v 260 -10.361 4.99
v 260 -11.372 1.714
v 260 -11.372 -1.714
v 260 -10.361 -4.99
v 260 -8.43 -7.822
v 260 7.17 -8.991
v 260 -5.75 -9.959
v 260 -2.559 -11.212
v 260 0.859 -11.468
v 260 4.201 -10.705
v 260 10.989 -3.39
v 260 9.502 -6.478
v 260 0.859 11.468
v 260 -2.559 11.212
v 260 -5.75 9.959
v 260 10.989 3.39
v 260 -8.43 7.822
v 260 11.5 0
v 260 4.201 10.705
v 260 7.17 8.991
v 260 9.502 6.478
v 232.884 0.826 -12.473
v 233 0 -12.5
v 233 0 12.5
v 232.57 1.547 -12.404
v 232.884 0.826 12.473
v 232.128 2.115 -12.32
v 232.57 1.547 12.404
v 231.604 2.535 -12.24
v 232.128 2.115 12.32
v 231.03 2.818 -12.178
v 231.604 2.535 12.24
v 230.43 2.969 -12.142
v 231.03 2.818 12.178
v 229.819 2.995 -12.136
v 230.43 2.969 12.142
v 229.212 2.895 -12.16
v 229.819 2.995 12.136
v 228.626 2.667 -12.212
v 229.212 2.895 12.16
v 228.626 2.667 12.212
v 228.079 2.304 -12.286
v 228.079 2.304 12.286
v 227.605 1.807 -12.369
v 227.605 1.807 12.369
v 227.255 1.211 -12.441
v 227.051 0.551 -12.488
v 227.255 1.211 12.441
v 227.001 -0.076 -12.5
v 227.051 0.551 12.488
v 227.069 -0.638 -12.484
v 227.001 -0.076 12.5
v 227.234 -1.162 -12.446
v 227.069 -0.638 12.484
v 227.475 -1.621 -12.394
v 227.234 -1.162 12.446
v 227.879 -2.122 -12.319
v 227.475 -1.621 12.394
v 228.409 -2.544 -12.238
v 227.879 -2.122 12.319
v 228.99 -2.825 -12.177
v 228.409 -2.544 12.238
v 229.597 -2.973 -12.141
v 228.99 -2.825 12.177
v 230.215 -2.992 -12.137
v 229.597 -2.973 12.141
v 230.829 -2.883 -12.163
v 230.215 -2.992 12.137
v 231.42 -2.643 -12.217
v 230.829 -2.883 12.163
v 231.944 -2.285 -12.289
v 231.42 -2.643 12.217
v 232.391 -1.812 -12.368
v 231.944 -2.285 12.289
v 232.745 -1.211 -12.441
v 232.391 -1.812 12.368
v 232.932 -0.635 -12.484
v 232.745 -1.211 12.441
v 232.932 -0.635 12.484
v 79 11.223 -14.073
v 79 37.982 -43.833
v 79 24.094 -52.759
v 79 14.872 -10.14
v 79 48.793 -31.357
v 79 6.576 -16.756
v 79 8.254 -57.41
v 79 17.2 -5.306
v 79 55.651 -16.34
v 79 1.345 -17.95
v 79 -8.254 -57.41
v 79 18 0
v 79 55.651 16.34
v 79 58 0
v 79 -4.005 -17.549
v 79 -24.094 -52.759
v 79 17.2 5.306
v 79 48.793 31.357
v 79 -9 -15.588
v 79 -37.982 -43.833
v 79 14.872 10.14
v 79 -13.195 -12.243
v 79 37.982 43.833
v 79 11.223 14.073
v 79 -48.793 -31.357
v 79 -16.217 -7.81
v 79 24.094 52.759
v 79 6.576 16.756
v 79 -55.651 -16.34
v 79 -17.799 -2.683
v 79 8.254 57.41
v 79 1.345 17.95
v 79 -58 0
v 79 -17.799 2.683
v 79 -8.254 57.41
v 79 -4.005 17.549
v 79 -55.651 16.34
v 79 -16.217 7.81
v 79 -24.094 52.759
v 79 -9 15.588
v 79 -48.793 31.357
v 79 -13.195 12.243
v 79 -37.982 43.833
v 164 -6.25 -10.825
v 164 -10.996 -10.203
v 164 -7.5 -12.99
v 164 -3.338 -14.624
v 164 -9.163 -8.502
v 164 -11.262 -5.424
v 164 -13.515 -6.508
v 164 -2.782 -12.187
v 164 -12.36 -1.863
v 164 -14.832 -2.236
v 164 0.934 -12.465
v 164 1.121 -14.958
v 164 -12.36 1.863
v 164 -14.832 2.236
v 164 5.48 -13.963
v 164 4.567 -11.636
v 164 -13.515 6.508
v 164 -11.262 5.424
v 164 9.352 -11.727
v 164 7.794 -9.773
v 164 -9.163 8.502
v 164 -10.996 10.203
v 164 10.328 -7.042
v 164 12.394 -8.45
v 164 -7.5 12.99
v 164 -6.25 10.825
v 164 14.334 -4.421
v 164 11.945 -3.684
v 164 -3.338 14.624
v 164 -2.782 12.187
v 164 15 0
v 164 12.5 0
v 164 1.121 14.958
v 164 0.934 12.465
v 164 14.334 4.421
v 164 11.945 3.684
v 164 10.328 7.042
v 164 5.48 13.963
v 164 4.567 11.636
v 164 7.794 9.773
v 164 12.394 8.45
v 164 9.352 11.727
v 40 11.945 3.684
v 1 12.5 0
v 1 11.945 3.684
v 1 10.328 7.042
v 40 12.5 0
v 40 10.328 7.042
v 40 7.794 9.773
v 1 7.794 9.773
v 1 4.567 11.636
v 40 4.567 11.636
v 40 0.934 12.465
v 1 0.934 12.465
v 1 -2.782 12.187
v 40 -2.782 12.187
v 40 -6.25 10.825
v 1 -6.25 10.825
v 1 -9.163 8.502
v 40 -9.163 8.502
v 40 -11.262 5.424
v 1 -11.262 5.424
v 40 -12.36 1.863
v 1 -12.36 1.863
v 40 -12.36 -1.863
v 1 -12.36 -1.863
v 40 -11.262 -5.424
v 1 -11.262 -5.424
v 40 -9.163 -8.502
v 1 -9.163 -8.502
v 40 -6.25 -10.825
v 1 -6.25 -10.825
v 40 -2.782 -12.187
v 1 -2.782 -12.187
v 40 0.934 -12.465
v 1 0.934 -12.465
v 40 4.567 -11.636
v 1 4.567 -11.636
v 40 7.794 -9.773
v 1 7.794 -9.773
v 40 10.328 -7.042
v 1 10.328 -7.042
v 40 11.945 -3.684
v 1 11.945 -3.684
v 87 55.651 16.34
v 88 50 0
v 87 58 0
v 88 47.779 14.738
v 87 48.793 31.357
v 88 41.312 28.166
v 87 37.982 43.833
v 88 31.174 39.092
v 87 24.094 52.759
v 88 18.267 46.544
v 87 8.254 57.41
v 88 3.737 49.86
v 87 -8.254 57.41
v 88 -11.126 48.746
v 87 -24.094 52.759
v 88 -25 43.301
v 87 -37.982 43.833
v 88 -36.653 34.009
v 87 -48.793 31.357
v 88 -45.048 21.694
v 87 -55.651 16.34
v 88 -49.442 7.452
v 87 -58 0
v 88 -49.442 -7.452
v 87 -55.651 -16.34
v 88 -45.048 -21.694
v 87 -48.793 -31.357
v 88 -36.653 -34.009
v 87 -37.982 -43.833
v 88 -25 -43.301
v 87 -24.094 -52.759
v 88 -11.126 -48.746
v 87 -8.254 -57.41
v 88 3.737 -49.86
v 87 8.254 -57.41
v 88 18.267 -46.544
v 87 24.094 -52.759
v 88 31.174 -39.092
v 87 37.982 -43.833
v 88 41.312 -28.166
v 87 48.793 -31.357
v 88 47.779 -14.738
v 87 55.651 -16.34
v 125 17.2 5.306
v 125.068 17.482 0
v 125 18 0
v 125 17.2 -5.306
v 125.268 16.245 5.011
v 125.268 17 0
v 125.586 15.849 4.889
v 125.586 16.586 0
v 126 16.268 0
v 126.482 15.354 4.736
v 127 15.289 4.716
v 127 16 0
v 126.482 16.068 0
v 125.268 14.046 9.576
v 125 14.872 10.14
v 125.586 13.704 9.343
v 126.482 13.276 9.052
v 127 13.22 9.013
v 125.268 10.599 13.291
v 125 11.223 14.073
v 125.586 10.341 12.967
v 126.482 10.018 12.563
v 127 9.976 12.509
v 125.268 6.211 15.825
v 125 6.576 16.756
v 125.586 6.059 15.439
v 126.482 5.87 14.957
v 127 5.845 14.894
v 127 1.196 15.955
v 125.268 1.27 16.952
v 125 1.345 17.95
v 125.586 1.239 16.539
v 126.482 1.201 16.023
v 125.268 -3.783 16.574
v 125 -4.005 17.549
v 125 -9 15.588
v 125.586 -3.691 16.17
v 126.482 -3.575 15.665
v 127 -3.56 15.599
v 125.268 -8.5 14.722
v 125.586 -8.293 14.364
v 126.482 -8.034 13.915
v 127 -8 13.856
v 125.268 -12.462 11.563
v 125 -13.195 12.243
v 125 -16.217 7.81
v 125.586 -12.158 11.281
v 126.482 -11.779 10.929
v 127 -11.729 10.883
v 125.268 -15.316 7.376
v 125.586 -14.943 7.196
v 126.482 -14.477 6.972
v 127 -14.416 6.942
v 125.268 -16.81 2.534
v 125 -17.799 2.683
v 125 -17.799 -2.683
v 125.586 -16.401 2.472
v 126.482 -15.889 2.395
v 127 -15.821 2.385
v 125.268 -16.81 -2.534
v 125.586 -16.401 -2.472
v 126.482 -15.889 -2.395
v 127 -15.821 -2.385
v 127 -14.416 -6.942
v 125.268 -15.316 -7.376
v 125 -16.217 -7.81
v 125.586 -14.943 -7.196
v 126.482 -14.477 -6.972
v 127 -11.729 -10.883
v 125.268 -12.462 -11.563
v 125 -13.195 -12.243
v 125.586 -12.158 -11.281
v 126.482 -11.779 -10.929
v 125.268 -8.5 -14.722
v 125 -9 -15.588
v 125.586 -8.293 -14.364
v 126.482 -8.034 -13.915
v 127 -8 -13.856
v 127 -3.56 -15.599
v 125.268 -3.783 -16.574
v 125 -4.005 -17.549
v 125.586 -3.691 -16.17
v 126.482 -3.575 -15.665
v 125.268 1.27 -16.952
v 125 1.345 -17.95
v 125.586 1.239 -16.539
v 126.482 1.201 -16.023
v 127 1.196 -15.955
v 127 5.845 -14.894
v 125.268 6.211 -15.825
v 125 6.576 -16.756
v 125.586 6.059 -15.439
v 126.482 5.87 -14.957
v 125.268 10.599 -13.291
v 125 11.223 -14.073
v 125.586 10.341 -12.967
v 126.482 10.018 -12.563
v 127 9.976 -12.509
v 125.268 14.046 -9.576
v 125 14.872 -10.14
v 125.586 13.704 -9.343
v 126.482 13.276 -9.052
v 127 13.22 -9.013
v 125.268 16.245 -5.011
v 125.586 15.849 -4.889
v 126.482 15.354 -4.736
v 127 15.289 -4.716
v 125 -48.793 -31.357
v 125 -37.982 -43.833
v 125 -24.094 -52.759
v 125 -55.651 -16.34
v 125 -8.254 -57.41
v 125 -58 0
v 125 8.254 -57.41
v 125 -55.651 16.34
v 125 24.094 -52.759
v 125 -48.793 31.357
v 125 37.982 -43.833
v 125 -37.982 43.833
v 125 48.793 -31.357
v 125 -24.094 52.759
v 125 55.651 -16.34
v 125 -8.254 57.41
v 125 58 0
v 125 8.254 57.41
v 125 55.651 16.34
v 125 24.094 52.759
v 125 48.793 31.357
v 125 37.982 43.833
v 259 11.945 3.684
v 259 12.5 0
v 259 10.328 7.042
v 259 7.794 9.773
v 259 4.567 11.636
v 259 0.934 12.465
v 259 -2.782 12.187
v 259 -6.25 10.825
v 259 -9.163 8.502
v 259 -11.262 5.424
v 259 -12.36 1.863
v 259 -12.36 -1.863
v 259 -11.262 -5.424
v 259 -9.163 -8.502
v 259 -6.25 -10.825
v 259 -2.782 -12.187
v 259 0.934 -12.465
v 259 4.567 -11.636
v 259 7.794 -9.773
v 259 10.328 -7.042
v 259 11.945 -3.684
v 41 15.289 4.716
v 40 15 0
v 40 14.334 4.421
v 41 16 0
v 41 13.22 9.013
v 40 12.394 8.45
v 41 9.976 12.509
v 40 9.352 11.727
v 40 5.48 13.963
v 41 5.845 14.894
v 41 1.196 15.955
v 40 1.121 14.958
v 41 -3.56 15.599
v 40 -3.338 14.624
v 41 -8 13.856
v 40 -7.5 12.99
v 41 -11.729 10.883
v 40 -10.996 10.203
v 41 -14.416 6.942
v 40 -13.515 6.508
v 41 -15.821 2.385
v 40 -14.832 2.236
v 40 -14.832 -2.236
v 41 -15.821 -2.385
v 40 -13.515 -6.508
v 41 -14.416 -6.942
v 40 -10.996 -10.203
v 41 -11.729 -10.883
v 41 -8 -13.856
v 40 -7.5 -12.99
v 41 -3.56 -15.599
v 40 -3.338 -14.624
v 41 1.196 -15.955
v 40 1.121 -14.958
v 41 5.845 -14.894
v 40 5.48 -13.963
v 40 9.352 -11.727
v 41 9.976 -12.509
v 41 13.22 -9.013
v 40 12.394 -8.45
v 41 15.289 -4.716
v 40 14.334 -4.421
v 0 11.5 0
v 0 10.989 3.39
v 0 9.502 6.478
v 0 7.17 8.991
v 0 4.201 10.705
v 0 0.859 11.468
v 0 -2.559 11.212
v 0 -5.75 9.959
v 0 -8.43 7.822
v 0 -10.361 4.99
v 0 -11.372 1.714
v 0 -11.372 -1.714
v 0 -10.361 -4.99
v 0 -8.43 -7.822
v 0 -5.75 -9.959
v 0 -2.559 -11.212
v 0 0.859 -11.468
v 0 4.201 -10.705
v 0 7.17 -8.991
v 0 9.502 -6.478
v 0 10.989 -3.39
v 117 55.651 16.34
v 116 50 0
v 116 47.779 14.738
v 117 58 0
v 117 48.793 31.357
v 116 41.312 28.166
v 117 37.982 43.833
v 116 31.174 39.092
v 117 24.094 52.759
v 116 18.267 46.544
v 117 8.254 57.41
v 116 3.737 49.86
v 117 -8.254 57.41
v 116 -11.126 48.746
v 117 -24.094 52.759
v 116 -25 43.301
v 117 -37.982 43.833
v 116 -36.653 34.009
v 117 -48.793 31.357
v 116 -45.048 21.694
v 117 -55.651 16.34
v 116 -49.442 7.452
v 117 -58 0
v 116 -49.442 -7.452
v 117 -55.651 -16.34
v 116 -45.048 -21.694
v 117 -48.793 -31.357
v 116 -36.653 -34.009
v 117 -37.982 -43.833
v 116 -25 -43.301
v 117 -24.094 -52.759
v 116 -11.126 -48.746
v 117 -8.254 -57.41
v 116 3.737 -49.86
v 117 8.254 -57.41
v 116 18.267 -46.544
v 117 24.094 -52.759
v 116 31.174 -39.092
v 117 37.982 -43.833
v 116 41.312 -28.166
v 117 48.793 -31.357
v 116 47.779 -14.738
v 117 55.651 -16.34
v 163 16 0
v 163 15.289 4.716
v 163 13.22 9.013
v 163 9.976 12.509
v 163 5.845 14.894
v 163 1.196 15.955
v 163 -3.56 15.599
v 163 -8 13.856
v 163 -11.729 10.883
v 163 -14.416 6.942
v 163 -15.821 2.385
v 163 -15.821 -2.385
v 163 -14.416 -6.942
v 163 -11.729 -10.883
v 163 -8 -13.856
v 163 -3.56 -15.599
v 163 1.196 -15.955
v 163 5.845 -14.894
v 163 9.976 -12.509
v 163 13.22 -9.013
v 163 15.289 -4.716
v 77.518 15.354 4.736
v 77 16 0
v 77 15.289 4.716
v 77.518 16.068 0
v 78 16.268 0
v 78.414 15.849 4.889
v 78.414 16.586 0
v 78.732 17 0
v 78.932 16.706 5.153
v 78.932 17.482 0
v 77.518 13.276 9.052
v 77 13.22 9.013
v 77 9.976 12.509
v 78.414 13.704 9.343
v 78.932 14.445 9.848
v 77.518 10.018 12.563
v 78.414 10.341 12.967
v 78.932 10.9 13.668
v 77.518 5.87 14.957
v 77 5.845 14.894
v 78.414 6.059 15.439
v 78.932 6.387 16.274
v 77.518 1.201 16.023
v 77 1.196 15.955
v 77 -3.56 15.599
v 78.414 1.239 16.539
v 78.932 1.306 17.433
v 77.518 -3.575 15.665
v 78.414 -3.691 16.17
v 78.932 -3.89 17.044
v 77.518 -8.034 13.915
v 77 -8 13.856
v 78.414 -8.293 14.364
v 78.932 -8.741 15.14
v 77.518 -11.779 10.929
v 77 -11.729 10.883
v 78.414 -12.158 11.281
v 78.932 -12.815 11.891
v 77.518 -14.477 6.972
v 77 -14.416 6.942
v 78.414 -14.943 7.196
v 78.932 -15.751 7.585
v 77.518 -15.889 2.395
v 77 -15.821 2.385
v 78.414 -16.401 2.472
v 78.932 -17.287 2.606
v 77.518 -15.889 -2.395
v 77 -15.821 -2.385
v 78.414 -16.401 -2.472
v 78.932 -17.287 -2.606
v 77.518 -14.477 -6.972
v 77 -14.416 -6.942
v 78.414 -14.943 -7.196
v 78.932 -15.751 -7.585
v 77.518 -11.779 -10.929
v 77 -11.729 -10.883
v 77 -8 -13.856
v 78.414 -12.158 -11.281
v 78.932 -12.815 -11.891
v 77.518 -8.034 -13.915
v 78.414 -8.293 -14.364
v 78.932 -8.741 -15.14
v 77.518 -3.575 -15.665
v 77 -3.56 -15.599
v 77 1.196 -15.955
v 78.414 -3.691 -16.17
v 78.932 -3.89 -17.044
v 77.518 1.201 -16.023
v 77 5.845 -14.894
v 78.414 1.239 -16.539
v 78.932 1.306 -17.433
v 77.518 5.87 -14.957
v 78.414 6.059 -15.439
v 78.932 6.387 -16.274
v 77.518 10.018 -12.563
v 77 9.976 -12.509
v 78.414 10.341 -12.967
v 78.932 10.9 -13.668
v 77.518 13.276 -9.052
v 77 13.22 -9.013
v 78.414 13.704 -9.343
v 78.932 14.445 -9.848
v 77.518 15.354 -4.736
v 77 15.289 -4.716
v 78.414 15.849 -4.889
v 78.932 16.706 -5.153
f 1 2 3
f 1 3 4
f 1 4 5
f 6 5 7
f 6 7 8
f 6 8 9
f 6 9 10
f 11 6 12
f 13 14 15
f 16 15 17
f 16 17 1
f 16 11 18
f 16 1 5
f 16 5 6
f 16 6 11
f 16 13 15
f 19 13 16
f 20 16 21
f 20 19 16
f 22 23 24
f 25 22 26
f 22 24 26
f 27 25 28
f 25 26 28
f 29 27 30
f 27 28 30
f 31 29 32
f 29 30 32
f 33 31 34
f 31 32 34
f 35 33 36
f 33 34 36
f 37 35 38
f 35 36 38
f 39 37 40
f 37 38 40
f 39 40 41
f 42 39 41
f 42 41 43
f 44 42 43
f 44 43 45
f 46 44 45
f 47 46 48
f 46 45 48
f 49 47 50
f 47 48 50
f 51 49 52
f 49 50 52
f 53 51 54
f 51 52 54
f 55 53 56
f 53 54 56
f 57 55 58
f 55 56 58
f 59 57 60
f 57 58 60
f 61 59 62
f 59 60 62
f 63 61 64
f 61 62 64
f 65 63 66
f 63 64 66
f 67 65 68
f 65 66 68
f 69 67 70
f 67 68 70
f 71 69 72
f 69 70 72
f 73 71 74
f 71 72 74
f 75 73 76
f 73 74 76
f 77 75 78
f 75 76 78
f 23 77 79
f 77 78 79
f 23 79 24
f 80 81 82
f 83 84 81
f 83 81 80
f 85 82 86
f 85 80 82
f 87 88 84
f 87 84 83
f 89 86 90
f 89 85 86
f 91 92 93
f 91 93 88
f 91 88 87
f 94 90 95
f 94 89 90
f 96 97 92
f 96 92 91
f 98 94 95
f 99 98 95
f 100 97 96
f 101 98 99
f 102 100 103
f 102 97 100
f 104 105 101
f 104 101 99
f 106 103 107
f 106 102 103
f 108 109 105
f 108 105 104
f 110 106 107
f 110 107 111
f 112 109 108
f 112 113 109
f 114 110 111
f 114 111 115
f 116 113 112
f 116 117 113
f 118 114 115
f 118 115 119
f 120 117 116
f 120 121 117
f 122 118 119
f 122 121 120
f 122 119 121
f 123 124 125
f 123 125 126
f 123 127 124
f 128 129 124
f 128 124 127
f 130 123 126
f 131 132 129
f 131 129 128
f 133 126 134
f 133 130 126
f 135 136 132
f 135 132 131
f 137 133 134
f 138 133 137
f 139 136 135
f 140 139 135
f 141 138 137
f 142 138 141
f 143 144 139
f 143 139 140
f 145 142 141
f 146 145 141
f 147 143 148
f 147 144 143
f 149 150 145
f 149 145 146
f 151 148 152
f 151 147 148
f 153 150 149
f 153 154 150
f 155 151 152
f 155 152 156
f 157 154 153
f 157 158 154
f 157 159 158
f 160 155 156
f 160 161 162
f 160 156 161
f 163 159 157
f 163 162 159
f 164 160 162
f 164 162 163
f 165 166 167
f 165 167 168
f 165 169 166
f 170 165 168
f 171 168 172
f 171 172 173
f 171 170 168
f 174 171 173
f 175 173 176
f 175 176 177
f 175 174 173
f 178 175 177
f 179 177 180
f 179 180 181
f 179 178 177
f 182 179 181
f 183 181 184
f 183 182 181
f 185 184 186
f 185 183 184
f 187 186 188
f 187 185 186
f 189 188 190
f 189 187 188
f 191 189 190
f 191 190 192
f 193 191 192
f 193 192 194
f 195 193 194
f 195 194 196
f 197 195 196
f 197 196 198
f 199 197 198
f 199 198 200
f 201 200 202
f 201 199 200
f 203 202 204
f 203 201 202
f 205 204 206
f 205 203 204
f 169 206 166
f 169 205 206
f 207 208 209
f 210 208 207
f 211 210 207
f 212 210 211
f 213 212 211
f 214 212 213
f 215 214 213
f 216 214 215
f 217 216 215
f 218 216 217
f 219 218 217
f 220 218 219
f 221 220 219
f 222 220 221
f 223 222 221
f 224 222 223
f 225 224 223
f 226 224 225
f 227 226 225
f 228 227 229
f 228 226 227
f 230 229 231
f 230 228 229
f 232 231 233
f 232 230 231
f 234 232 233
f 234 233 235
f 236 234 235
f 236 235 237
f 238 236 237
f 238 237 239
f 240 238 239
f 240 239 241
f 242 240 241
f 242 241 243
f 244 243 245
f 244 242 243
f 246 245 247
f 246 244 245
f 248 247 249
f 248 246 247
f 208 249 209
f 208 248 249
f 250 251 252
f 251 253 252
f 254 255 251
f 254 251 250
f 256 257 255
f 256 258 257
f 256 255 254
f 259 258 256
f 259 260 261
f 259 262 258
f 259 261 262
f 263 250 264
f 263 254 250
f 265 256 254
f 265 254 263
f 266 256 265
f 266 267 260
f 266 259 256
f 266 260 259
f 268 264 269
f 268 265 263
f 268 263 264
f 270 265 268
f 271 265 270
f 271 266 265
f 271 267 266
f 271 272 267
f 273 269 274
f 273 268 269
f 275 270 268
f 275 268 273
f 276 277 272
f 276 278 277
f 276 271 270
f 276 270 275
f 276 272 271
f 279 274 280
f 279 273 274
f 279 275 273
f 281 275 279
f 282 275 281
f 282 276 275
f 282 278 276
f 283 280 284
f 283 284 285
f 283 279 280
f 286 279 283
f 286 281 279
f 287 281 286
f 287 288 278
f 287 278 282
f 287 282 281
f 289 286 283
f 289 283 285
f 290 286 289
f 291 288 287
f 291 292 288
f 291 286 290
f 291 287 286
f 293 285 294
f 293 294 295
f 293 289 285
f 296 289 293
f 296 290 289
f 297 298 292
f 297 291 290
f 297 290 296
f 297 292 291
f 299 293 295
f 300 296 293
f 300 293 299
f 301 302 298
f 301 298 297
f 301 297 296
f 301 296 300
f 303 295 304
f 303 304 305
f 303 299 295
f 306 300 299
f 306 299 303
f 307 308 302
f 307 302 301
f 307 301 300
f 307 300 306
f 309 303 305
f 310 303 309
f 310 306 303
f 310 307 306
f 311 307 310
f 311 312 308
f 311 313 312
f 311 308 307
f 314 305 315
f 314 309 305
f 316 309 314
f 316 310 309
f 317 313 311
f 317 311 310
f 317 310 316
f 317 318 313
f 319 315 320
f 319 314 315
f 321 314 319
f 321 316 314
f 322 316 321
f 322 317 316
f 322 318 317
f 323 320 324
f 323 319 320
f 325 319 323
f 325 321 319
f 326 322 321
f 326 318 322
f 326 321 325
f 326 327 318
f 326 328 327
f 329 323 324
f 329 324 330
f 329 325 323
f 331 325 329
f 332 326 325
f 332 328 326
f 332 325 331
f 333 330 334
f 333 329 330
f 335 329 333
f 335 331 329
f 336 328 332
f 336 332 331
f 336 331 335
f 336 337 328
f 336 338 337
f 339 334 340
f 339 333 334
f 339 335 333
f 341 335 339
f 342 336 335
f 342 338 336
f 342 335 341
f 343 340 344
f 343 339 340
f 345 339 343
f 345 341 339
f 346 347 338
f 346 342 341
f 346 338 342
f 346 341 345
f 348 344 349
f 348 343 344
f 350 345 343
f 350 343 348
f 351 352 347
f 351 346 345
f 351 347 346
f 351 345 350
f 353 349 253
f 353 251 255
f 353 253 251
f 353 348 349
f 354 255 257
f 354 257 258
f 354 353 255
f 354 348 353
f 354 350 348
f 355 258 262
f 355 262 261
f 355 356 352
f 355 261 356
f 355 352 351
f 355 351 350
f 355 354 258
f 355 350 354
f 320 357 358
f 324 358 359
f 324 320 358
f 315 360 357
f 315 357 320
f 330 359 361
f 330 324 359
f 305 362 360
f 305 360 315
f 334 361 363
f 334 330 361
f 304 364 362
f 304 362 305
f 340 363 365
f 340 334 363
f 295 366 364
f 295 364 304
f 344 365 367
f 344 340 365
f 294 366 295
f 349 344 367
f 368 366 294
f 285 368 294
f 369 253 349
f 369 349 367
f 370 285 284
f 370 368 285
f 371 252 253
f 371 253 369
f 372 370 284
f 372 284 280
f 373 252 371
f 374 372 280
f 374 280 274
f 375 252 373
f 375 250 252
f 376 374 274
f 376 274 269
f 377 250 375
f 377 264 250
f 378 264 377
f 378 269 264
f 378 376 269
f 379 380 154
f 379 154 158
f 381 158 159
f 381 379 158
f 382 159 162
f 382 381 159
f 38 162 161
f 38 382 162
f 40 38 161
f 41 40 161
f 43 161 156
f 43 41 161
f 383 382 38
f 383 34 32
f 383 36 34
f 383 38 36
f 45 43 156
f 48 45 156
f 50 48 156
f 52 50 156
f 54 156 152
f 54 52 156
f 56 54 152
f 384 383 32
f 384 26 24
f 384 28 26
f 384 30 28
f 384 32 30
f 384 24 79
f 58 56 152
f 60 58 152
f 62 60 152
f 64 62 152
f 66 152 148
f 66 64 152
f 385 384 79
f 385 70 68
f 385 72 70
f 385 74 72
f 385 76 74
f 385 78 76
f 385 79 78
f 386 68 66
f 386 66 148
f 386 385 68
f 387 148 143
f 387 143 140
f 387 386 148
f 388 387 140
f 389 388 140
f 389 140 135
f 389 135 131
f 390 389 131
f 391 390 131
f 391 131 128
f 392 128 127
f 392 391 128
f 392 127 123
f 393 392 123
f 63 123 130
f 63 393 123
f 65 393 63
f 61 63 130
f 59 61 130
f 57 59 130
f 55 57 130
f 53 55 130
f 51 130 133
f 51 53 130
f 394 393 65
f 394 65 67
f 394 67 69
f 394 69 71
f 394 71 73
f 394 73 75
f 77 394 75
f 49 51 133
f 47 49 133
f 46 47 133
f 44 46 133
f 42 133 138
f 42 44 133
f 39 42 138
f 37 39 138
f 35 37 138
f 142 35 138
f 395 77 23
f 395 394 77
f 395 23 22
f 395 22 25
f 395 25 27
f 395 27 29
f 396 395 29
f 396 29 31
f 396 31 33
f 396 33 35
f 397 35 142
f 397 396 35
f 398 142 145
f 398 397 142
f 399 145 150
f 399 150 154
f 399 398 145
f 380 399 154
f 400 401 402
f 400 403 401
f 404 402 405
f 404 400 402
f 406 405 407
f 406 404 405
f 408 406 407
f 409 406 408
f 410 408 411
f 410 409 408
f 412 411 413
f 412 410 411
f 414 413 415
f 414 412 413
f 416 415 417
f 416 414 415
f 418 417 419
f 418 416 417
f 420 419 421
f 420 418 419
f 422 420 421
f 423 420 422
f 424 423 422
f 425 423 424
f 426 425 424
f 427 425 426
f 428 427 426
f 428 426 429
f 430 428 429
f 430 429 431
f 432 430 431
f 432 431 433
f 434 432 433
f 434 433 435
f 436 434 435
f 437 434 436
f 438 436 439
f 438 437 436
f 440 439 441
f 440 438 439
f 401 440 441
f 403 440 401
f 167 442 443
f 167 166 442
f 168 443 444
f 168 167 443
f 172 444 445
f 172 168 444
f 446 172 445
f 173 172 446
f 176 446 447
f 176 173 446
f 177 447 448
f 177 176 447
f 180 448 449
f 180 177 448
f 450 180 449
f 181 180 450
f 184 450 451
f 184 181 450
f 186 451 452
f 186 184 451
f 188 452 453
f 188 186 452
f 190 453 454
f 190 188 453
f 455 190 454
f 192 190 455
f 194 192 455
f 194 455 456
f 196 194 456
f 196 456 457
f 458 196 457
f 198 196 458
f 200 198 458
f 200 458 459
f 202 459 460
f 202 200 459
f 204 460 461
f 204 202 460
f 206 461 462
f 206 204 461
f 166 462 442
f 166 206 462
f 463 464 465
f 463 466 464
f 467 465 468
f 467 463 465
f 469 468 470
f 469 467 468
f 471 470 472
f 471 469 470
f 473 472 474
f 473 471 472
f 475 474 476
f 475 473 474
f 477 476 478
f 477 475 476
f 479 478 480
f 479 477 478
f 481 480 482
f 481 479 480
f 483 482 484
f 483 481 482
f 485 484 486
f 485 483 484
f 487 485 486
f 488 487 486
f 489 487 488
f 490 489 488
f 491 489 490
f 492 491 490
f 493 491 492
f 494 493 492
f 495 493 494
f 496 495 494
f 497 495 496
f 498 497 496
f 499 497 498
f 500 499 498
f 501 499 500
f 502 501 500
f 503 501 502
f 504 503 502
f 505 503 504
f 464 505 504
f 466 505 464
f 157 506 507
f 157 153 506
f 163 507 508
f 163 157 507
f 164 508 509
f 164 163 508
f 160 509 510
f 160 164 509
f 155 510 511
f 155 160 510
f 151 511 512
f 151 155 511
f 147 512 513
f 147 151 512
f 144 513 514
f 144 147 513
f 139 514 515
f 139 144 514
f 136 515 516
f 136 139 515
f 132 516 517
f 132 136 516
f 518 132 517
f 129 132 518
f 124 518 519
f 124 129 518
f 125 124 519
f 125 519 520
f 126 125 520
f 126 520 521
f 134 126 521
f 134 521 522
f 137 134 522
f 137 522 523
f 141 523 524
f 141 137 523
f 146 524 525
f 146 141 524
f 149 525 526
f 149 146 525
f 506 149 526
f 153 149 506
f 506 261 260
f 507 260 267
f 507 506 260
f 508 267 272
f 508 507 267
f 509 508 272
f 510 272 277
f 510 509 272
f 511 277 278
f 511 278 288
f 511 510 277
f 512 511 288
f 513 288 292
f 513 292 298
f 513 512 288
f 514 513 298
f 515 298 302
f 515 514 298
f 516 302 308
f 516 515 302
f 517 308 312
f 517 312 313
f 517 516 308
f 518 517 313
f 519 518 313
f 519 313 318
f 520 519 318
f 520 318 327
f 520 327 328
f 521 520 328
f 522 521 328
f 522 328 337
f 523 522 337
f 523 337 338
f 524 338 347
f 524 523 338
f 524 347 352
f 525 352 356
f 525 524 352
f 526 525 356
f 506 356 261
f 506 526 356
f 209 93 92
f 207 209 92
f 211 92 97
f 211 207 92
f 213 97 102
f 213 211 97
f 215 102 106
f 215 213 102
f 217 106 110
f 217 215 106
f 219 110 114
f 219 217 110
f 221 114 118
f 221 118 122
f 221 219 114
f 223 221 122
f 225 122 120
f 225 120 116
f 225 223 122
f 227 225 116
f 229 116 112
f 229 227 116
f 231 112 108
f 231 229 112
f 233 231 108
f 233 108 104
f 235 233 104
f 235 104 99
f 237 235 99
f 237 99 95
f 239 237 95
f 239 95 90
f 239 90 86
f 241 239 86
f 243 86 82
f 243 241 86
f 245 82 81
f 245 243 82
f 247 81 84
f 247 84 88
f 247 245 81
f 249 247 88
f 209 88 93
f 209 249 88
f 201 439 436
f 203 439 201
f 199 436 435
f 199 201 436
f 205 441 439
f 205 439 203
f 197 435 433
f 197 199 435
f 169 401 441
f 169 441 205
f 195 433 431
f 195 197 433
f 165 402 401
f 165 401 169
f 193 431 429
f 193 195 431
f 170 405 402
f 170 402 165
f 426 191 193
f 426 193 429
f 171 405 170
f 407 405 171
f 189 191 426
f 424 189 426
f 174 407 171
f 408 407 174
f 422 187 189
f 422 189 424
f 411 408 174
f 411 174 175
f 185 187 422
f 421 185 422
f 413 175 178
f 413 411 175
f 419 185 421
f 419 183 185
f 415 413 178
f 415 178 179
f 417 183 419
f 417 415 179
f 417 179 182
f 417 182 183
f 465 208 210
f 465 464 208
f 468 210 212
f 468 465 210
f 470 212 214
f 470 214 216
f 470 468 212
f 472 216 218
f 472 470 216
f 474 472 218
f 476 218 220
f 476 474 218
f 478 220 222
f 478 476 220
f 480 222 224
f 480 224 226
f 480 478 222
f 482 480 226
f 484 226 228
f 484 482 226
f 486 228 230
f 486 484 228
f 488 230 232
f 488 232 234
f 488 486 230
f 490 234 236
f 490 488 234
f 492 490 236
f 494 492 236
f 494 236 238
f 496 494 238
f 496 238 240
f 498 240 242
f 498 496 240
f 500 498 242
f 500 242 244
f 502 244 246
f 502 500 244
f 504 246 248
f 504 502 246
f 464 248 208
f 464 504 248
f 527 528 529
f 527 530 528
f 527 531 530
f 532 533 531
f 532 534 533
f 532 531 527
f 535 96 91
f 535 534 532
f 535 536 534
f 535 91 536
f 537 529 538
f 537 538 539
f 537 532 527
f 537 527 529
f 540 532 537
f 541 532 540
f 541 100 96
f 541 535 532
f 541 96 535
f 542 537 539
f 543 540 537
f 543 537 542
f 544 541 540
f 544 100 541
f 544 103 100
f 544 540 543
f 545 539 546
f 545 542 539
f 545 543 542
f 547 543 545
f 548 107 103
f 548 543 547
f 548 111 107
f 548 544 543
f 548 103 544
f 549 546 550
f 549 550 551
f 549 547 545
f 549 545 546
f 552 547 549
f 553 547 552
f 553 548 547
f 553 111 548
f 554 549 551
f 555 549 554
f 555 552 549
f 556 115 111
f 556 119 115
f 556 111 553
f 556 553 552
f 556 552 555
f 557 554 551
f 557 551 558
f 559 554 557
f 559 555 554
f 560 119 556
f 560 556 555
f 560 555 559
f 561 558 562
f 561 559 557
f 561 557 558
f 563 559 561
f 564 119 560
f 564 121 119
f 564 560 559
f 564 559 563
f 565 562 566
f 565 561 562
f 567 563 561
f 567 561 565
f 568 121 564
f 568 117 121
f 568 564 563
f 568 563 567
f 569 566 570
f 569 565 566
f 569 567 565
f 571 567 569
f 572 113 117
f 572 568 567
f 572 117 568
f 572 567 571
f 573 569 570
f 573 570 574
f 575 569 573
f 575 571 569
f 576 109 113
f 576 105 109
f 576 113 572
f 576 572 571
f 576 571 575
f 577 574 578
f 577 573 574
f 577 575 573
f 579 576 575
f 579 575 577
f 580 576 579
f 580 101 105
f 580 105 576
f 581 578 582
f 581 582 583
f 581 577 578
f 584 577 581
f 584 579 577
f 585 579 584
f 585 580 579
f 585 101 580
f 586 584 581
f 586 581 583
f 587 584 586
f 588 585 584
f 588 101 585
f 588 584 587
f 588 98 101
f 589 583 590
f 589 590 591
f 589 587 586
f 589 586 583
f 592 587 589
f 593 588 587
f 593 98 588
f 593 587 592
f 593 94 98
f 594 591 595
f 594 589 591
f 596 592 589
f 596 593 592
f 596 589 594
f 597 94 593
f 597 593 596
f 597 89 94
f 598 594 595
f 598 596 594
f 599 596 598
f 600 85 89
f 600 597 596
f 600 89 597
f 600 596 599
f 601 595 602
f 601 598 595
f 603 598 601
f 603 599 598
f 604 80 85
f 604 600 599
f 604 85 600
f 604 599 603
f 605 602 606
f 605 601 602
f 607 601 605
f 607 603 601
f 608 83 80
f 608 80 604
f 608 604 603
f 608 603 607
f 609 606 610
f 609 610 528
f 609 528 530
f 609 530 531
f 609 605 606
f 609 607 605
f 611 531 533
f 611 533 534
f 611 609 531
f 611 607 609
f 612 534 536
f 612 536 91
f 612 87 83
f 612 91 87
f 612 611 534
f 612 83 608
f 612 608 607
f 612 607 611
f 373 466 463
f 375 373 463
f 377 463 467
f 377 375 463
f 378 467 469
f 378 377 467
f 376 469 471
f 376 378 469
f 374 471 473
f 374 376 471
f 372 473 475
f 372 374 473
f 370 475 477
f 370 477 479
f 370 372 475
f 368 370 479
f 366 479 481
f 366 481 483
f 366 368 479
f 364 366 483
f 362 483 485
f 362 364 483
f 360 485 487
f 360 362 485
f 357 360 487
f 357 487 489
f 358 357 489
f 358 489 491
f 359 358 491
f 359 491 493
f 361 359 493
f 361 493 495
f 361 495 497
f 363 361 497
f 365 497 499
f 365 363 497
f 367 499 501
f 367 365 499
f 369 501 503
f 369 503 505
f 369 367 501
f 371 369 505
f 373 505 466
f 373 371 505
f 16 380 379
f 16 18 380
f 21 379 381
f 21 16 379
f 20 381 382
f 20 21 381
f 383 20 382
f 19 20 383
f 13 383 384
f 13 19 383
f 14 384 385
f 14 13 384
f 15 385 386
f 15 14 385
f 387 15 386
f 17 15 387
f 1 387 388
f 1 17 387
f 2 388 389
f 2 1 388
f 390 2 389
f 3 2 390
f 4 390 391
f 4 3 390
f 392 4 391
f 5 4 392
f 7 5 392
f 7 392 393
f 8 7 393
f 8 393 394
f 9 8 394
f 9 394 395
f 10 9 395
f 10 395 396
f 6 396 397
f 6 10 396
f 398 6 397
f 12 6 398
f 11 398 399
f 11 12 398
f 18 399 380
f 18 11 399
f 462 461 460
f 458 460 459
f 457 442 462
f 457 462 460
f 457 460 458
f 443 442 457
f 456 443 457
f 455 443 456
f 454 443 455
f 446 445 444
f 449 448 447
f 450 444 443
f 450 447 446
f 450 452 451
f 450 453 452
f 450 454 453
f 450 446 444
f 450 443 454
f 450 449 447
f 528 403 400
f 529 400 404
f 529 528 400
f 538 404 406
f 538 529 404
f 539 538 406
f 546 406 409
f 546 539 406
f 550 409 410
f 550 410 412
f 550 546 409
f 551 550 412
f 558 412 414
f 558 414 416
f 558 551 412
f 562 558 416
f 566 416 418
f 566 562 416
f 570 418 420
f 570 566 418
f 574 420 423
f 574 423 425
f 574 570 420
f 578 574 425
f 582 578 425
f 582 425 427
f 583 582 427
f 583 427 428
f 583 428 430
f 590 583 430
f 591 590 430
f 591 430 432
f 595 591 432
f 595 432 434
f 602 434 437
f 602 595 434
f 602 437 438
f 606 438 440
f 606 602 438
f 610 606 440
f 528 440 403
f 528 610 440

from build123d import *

# Parameters (mm, degrees)
SKETCH_2_R          = 3
CUT_EXTRUDE_1_DEPTH = 15


with BuildPart() as part:
    # 草图1 → 旋转1 (revolve)
    with BuildSketch(Plane.XY):
        with BuildLine():
            Line((41, 16), (77, 16))
            ThreePointArc((77, 16), (78.414213562, 16.585786438), (79, 18))
            Line((79, 18), (79, 58))
            Line((79, 58), (87, 58))
            Line((87, 58), (88, 50))
            Line((88, 50), (116, 50))
            Line((116, 50), (117, 58))
            Line((117, 58), (125, 58))
            Line((125, 58), (125, 18))
            ThreePointArc((125, 18), (125.585786438, 16.585786438), (127, 16))
            Line((127, 16), (163, 16))
            Line((163, 16), (164, 15))
            Line((164, 15), (164, 12.5))
            Line((164, 12.5), (259, 12.5))
            Line((259, 12.5), (260, 11.5))
            Line((260, 11.5), (260, 0))
            Line((260, 0), (0, 0))
            Line((0, 0), (0, 11.5))
            Line((0, 11.5), (1, 12.5))
            Line((1, 12.5), (40, 12.5))
            Line((40, 12.5), (40, 15))
            Line((40, 15), (41, 16))
        make_face()
    revolve(axis=Axis((0, 0, 0), (1, 0, 0)))

    # 草图2 → 切除-拉伸1 (cut, symmetric)
    with BuildSketch(Plane.XY):
        with Locations((230, 0)):
            Circle(SKETCH_2_R)
    extrude(amount=CUT_EXTRUDE_1_DEPTH, both=True, mode=Mode.SUBTRACT)


solid = part.part
